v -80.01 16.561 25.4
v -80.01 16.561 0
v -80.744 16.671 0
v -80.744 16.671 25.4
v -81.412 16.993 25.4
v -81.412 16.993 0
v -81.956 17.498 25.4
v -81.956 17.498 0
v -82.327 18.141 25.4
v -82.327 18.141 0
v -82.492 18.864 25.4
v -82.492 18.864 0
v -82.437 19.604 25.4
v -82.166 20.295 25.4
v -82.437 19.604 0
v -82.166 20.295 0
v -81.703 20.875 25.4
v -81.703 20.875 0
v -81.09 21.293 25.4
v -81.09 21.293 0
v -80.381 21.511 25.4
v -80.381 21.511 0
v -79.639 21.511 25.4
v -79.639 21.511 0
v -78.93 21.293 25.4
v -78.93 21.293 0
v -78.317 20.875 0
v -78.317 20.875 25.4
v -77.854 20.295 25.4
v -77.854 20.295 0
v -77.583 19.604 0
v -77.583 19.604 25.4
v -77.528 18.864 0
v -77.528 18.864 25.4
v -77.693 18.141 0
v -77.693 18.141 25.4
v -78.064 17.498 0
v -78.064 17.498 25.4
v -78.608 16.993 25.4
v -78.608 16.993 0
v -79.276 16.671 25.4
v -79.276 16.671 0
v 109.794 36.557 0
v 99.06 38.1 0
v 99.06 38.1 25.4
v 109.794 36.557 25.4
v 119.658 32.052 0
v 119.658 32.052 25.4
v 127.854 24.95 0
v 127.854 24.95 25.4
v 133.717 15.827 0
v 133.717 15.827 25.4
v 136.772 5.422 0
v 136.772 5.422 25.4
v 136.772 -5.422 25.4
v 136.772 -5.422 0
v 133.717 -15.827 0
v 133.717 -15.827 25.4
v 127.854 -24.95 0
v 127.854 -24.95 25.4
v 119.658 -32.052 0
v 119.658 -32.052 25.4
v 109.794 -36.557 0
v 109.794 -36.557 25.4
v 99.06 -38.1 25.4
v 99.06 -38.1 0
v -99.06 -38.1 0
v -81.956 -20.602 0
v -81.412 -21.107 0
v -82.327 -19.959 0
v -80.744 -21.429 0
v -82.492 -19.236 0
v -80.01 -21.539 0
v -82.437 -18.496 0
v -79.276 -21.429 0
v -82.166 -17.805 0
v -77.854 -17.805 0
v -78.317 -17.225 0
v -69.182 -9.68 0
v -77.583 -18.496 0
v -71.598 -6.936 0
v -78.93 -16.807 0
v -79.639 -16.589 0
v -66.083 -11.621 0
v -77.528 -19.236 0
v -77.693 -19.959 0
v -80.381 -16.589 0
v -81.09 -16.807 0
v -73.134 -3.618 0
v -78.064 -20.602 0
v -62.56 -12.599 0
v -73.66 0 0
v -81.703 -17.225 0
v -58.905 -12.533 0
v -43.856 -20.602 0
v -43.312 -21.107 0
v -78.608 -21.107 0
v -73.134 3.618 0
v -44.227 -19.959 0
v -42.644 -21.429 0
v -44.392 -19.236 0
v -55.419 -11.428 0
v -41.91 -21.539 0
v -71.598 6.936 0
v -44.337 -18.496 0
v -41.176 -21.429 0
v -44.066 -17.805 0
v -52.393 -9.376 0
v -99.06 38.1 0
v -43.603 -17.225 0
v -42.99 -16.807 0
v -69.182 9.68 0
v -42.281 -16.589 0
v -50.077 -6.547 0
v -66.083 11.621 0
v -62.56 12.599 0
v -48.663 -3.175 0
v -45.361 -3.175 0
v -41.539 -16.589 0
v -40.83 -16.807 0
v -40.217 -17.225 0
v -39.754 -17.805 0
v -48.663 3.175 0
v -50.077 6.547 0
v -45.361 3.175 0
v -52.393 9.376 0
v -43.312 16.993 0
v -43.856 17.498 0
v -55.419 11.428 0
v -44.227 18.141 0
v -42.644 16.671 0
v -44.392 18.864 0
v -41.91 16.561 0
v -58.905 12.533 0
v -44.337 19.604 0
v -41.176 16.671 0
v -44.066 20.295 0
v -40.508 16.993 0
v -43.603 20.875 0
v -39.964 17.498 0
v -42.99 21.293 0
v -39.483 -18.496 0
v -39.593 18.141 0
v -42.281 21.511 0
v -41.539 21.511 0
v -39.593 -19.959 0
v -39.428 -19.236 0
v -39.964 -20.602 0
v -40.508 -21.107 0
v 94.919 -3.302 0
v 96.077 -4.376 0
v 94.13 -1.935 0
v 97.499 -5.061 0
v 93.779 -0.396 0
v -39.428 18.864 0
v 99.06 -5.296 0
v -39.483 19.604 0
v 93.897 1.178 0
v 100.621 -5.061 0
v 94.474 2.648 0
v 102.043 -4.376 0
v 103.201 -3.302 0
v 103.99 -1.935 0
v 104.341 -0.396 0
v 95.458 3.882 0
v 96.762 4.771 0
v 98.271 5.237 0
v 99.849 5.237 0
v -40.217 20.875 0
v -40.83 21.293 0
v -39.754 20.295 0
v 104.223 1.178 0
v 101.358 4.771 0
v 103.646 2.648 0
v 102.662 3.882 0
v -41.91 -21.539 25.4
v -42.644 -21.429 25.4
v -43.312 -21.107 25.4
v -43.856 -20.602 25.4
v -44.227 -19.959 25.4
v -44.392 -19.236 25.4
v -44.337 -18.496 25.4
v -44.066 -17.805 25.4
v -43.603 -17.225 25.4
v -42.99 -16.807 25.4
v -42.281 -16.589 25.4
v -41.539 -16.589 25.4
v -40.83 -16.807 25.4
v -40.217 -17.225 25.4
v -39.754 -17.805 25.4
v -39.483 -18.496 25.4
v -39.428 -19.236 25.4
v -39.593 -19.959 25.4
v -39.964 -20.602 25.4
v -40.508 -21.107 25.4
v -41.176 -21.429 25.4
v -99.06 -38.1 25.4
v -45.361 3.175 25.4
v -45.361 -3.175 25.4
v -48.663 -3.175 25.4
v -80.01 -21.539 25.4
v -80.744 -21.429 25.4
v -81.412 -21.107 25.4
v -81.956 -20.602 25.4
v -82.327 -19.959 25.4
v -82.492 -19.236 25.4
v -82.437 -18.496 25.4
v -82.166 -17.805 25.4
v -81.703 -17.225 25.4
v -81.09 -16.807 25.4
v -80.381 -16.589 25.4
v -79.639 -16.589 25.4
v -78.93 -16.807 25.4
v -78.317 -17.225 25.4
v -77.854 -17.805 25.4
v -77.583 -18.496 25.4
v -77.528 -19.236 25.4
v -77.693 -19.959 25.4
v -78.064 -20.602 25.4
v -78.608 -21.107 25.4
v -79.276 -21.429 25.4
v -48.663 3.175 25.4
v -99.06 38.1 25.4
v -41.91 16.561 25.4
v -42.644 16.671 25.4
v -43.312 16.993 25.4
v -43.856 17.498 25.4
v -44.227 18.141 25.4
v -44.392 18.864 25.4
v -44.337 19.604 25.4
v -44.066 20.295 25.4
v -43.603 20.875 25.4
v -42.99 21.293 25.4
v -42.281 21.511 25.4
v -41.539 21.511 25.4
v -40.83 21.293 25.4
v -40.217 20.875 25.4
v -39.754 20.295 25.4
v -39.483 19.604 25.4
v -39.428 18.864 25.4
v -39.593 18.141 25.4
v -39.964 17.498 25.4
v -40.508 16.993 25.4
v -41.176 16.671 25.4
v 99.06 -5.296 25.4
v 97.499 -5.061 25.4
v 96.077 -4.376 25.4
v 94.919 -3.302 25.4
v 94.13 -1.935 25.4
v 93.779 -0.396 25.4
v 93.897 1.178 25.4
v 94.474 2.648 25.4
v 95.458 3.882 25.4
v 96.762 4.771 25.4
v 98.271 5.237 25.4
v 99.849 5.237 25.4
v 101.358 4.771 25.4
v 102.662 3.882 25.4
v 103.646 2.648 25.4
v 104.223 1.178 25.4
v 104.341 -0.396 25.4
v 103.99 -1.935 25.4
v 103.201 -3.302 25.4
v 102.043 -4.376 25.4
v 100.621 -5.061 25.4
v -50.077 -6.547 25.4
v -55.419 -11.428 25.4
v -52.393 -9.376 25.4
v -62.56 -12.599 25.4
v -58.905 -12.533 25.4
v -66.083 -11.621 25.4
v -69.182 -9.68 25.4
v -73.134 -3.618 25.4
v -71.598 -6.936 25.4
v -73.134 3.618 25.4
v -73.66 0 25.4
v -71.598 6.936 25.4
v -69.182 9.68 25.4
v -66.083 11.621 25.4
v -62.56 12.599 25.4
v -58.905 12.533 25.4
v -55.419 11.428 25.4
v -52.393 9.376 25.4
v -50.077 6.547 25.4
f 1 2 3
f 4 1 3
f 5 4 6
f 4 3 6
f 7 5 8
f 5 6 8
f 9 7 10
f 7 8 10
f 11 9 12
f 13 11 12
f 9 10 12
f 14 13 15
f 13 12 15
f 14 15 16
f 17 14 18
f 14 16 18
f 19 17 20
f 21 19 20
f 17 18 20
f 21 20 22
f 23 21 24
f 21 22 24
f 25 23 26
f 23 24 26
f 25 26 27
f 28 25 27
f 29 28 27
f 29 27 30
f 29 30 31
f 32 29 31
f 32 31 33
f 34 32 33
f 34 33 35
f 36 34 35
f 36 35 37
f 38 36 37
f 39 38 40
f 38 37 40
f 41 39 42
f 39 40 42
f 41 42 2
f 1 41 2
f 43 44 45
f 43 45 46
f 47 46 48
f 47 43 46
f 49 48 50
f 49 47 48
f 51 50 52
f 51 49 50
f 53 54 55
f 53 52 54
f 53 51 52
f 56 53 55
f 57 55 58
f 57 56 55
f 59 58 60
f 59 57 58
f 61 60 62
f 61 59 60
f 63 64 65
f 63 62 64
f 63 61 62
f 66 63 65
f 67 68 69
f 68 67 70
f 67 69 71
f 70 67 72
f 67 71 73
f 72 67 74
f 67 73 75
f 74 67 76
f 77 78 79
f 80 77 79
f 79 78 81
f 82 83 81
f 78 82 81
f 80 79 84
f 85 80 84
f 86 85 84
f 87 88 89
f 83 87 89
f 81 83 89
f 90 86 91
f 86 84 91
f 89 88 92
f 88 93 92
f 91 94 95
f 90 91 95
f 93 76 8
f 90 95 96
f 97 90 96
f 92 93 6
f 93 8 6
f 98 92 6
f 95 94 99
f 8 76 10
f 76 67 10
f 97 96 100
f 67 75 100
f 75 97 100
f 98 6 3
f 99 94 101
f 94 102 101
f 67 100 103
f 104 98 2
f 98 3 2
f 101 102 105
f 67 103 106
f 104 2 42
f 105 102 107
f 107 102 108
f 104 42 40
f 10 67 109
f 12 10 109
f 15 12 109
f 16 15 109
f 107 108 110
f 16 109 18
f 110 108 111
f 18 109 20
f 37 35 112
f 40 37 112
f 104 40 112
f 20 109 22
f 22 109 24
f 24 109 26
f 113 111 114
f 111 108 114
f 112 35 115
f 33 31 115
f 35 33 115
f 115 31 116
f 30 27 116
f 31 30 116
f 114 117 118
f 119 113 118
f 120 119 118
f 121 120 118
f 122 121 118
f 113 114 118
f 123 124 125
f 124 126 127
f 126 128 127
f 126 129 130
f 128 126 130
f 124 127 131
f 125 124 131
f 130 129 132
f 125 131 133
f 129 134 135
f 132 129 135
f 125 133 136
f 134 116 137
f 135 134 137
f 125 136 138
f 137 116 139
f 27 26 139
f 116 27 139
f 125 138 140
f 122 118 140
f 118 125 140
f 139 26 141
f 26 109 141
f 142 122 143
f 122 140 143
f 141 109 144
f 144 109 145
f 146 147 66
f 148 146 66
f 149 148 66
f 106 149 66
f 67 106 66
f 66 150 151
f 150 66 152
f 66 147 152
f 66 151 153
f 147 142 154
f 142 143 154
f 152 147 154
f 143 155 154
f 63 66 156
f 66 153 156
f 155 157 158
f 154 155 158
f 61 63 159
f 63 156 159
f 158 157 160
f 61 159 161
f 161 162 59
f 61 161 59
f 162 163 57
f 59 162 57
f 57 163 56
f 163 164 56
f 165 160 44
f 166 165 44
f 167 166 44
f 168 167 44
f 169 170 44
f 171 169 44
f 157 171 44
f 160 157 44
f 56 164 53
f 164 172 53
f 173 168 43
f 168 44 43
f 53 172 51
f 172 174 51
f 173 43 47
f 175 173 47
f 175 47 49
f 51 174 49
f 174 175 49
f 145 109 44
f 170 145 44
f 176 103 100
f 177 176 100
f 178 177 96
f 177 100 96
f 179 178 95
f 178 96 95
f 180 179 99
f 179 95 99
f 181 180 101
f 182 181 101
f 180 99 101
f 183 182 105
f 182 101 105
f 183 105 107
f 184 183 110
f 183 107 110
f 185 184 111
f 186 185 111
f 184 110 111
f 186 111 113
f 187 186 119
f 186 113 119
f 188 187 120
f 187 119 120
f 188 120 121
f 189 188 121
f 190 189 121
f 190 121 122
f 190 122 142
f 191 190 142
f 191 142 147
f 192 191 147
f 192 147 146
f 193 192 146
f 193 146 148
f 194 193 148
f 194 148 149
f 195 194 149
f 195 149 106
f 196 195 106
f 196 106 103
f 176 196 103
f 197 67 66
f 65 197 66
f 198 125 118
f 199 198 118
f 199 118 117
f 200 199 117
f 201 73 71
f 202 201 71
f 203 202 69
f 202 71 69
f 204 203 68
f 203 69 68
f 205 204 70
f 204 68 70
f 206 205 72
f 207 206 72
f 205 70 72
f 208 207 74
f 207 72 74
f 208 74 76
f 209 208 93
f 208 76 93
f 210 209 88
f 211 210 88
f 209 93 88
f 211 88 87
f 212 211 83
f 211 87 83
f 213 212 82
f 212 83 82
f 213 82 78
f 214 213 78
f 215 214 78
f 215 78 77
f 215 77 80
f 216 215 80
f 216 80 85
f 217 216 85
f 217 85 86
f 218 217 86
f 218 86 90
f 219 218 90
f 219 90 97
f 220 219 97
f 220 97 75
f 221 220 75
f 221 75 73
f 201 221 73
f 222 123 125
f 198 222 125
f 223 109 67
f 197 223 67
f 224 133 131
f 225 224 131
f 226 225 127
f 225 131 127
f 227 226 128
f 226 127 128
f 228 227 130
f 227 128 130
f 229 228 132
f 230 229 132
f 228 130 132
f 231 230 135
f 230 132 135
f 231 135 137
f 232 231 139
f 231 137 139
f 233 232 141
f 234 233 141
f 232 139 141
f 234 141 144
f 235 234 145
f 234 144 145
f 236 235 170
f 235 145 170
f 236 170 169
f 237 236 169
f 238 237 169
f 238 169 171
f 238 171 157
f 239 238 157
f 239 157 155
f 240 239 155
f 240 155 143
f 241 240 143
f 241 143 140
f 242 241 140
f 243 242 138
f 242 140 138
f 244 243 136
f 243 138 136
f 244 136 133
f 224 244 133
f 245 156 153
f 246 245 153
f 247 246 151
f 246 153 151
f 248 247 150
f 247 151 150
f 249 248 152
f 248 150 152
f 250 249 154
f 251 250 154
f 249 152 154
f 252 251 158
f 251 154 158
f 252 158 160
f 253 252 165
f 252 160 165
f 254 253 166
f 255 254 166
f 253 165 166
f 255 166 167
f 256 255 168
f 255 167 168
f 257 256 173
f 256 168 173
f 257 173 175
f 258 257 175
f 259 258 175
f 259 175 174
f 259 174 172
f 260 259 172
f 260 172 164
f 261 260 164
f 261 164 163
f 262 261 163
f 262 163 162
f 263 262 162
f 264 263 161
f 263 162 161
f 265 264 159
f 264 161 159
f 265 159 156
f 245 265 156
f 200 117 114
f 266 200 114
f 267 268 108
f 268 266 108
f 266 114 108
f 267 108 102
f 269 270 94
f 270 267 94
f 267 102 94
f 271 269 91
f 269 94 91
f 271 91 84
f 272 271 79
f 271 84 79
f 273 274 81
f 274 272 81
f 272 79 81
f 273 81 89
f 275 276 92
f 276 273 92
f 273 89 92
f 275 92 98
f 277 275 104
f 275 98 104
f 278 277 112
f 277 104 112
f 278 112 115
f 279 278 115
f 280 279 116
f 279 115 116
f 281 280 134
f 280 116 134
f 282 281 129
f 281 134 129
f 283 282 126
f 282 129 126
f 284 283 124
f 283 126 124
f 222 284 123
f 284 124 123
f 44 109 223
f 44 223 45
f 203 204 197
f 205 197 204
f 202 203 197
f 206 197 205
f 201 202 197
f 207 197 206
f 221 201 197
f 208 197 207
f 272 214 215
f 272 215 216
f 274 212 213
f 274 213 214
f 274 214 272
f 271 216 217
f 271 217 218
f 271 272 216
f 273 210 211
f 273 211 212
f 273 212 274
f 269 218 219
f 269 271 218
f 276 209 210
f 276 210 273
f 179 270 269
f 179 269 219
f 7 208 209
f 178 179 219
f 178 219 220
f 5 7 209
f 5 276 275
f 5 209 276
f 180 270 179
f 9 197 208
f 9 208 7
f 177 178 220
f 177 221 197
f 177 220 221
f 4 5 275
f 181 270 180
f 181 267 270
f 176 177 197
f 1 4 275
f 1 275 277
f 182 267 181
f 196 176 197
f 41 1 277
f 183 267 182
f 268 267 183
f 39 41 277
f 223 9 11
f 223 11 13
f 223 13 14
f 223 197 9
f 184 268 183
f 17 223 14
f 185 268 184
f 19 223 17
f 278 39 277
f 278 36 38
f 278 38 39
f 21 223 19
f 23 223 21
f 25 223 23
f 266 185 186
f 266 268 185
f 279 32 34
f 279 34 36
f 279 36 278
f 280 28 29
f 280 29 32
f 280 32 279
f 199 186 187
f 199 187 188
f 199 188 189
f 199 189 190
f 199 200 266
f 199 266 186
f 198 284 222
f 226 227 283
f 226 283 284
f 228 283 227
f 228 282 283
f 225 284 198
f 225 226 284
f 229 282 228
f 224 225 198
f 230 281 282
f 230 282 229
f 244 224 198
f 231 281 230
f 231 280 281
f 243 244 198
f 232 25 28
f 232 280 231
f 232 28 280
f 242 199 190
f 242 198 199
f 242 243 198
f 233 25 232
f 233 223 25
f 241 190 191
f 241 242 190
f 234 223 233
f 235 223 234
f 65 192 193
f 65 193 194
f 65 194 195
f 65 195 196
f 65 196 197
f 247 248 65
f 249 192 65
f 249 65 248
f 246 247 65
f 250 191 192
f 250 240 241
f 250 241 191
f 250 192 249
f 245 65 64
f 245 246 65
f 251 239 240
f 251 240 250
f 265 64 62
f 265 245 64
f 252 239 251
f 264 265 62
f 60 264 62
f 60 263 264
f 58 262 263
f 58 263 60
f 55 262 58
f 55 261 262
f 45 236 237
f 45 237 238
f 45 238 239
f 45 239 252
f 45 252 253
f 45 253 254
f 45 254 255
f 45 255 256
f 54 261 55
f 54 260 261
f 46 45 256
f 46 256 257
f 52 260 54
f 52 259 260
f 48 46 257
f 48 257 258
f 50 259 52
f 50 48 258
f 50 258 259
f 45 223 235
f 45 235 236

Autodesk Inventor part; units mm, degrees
ref_plane "YZ Plane" through (0, 0, 0) normal (1, 0, 0) x (0, 1, 0)
ref_plane "XZ Plane" through (0, 0, 0) normal (0, 1, 0) x (-1, 0, 0)
ref_plane "XY Plane" through (0, 0, 0) normal (0, 0, 1) x (1, 0, 0)
sketch "Sketch1" plane through (0, 0, 0) normal (0, 0, 1) x (1, 0, 0)
  line L0 (-99.06, 38.1) -> (-99.06, -38.1)
  circle A0 centre (-60.96, 0) radius 12.7
  circle A1 centre (99.06, 0) radius 1.27
  line L1 (-99.06, 38.1) -> (99.06, 38.1)
  line L2 (-99.06, -38.1) -> (99.06, -38.1)
  arc A2 (99.06, -38.1) -> (99.06, 38.1) centre (99.06, 0) ccw
  line L3 (-48.6633, 3.175) -> (-45.3613, 3.175)
  line L4 (-45.3613, 3.175) -> (-45.3613, -3.175)
  line L5 (-45.3613, -3.175) -> (-48.6633, -3.175)
  point P0 (0, 0)
  point P1 (-99.06, 0)
  point P2 (106.7321, -3.216)
  point P3 (113.0654, -3.216)
  point P4 (-45.3613, 0)
  point P5 (0, -38.1)
  dimension "d0" = 76.2
  dimension "d4" = 25.4
  dimension "d13" = 2.54
  dimension "d14" = 6.35
  dimension "d15" = 160.02
  dimension "d16" = 3.302
  dimension "d17" = 38.1
extrude "Extrusion2" add sketch "Sketch1" along normal blind 25.4
sketch "Sketch2" plane through (0, 0, 25.4) normal (0, 0, 1) x (1, 0, 0)
  arc A0 (-48.6633, 3.175) -> (-48.6633, -3.175) centre (-60.96, 0) ccw projected
  point P0 (0, 0)
  point P1 (-80.01, 19.05)
  point P2 (-41.91, 19.05)
  point P3 (-41.91, -19.05)
  point P4 (-80.01, -19.05)
  dimension "d20" = 38.1
  dimension "d21" = 38.1
  dimension "d22" = 19.05
  dimension "d23" = 19.05
hole "Hole1" at (-80.01, 19.05, 25.4) at (-41.91, 19.05, 25.4) at (-41.91, -19.05, 25.4) at (-80.01, -19.05, 25.4) direction (0, 0, -1) diameter 4.9784 depth 25.4 tip angle 118 thread size "1/4-20 UNC" class "2B" standard "ANSI Unified Screw Threads"
sketch "Sketch4" plane through (0, 0, 25.4) normal (0, 0, 1) x (1, 0, 0)
  circle A0 centre (99.06, 0) radius 1.27 projected
  point P0 (0, 0)
hole "Hole3" at (99.06, 0, 25.4) direction (0, 0, -1) diameter 10.5918 end through all thread size "1/2-13 UNC" class "2B" standard "ANSI Unified Screw Threads"
properties part number "Motor_Arm"
